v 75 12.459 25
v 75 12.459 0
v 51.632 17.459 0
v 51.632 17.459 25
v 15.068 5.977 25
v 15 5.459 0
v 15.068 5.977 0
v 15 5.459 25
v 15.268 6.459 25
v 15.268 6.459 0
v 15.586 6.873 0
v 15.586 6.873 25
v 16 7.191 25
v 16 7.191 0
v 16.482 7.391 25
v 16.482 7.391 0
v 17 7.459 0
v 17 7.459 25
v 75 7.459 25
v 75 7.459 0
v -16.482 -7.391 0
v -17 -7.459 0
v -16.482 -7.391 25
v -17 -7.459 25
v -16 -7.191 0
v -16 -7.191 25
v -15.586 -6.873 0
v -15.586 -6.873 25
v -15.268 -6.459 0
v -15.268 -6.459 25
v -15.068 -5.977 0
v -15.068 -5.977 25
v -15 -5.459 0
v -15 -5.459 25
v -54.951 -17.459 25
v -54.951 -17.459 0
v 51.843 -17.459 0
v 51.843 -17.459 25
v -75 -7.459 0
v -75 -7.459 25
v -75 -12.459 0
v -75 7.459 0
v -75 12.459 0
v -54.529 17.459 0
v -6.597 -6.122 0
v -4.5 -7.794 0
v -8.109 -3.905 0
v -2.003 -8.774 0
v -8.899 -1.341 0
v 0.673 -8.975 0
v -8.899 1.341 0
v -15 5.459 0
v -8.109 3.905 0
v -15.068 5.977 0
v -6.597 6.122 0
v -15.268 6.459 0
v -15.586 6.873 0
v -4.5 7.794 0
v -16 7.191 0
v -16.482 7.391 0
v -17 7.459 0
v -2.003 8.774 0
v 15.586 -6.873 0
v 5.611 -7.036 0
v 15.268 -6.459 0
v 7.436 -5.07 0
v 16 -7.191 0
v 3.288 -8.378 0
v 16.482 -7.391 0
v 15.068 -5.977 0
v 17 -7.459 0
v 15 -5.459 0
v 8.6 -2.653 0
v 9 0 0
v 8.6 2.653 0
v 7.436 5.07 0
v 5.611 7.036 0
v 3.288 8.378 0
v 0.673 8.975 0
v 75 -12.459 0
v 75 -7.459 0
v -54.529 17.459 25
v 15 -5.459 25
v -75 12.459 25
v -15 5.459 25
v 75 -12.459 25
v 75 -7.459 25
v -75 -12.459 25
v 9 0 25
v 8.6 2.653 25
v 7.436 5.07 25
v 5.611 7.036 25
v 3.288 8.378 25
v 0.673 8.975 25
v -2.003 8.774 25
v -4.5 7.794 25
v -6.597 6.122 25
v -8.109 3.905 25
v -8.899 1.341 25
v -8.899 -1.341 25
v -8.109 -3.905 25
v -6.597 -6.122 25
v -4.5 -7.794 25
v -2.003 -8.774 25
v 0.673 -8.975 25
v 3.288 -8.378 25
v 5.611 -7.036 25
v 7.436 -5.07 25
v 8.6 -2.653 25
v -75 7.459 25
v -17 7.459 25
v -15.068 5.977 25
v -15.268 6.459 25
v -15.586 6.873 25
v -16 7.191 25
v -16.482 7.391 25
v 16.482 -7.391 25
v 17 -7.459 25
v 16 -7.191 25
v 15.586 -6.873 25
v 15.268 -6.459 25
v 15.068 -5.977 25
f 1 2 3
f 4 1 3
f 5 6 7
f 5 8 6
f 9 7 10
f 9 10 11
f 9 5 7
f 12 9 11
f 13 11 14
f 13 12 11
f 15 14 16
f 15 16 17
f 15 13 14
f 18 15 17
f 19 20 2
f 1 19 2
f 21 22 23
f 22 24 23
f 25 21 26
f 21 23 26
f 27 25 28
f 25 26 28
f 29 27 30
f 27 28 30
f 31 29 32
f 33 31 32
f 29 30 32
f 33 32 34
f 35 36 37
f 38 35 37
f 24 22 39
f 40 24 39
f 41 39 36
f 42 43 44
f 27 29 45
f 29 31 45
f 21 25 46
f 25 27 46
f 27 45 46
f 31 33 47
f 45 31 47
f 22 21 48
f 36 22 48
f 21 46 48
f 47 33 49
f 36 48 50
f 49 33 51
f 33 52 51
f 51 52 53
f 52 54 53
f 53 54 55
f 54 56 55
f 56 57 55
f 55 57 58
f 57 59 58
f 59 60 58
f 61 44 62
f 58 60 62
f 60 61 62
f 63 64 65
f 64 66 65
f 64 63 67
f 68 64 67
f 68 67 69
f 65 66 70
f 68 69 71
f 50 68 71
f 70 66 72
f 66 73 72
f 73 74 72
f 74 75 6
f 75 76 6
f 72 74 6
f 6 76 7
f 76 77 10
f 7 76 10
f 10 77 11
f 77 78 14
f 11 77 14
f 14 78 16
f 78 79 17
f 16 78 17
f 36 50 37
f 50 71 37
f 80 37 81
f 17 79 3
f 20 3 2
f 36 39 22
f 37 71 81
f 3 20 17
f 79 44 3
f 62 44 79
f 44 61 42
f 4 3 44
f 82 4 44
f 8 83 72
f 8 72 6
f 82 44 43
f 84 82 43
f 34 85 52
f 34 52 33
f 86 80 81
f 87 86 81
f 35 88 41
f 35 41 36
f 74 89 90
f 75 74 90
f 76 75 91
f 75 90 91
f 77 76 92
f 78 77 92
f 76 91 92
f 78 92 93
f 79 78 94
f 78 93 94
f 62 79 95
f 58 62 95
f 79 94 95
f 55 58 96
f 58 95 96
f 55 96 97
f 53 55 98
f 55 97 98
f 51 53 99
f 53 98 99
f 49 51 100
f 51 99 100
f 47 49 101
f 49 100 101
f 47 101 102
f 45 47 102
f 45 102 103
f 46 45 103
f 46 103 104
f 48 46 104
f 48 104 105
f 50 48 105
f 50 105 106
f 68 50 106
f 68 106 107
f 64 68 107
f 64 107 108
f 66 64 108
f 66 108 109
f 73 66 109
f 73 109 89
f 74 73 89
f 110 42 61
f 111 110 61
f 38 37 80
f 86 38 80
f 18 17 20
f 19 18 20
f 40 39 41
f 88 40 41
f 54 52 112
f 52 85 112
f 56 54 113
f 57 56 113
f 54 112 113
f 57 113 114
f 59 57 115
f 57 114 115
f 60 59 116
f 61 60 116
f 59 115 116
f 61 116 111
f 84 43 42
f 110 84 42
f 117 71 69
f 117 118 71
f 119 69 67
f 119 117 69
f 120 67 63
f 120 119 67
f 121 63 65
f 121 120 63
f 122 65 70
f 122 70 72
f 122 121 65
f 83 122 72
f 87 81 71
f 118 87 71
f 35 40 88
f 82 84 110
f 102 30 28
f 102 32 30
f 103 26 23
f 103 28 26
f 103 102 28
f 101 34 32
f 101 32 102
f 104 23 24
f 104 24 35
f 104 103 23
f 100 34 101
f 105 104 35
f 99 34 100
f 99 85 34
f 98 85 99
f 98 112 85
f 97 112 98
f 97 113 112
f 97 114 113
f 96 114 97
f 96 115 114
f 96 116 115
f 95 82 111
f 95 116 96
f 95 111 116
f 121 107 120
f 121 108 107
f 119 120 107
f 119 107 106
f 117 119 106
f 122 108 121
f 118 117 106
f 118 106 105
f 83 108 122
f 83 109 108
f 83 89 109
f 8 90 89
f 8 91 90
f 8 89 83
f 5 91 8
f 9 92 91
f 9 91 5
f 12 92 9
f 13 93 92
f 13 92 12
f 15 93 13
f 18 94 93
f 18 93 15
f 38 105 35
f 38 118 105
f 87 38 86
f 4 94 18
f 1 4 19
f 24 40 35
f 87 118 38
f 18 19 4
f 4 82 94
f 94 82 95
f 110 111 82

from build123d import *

# Parameters (mm, degrees)
F1_DEPTH = 25
F2_R     = 9
F3_DEPTH = 40
F4_R     = 2


with BuildPart() as f1:
    # F0 (on Top) → F1 (new body)
    with BuildSketch(Plane.XY):
        Polygon((-15, -7.459), (-75, -7.459), (-75, -12.459), (-54.951493, -17.459), (51.843371, -17.459), (75, -12.459), (75, -7.459), (15, -7.459), (15, 7.459), (75, 7.459), (75, 12.459), (51.631901, 17.459), (-54.528542, 17.459), (-75, 12.459), (-75, 7.459), (-15, 7.459), align=None)
    extrude(amount=F1_DEPTH)

    # F2 (on face) → F3 (cut)
    with BuildSketch(Plane.XY.offset(25)):
        Circle(F2_R)
    extrude(amount=-F3_DEPTH, mode=Mode.SUBTRACT)

    # F4
    f4_edges = [f1.edges().sort_by_distance(p)[0] for p in [
        (-15, -7.459, 12.5),
        (-15, 7.459, 12.5),
        (15, -7.459, 12.5),
        (15, 7.459, 12.5),
    ]]
    fillet(f4_edges, radius=F4_R)


solid = f1.part
